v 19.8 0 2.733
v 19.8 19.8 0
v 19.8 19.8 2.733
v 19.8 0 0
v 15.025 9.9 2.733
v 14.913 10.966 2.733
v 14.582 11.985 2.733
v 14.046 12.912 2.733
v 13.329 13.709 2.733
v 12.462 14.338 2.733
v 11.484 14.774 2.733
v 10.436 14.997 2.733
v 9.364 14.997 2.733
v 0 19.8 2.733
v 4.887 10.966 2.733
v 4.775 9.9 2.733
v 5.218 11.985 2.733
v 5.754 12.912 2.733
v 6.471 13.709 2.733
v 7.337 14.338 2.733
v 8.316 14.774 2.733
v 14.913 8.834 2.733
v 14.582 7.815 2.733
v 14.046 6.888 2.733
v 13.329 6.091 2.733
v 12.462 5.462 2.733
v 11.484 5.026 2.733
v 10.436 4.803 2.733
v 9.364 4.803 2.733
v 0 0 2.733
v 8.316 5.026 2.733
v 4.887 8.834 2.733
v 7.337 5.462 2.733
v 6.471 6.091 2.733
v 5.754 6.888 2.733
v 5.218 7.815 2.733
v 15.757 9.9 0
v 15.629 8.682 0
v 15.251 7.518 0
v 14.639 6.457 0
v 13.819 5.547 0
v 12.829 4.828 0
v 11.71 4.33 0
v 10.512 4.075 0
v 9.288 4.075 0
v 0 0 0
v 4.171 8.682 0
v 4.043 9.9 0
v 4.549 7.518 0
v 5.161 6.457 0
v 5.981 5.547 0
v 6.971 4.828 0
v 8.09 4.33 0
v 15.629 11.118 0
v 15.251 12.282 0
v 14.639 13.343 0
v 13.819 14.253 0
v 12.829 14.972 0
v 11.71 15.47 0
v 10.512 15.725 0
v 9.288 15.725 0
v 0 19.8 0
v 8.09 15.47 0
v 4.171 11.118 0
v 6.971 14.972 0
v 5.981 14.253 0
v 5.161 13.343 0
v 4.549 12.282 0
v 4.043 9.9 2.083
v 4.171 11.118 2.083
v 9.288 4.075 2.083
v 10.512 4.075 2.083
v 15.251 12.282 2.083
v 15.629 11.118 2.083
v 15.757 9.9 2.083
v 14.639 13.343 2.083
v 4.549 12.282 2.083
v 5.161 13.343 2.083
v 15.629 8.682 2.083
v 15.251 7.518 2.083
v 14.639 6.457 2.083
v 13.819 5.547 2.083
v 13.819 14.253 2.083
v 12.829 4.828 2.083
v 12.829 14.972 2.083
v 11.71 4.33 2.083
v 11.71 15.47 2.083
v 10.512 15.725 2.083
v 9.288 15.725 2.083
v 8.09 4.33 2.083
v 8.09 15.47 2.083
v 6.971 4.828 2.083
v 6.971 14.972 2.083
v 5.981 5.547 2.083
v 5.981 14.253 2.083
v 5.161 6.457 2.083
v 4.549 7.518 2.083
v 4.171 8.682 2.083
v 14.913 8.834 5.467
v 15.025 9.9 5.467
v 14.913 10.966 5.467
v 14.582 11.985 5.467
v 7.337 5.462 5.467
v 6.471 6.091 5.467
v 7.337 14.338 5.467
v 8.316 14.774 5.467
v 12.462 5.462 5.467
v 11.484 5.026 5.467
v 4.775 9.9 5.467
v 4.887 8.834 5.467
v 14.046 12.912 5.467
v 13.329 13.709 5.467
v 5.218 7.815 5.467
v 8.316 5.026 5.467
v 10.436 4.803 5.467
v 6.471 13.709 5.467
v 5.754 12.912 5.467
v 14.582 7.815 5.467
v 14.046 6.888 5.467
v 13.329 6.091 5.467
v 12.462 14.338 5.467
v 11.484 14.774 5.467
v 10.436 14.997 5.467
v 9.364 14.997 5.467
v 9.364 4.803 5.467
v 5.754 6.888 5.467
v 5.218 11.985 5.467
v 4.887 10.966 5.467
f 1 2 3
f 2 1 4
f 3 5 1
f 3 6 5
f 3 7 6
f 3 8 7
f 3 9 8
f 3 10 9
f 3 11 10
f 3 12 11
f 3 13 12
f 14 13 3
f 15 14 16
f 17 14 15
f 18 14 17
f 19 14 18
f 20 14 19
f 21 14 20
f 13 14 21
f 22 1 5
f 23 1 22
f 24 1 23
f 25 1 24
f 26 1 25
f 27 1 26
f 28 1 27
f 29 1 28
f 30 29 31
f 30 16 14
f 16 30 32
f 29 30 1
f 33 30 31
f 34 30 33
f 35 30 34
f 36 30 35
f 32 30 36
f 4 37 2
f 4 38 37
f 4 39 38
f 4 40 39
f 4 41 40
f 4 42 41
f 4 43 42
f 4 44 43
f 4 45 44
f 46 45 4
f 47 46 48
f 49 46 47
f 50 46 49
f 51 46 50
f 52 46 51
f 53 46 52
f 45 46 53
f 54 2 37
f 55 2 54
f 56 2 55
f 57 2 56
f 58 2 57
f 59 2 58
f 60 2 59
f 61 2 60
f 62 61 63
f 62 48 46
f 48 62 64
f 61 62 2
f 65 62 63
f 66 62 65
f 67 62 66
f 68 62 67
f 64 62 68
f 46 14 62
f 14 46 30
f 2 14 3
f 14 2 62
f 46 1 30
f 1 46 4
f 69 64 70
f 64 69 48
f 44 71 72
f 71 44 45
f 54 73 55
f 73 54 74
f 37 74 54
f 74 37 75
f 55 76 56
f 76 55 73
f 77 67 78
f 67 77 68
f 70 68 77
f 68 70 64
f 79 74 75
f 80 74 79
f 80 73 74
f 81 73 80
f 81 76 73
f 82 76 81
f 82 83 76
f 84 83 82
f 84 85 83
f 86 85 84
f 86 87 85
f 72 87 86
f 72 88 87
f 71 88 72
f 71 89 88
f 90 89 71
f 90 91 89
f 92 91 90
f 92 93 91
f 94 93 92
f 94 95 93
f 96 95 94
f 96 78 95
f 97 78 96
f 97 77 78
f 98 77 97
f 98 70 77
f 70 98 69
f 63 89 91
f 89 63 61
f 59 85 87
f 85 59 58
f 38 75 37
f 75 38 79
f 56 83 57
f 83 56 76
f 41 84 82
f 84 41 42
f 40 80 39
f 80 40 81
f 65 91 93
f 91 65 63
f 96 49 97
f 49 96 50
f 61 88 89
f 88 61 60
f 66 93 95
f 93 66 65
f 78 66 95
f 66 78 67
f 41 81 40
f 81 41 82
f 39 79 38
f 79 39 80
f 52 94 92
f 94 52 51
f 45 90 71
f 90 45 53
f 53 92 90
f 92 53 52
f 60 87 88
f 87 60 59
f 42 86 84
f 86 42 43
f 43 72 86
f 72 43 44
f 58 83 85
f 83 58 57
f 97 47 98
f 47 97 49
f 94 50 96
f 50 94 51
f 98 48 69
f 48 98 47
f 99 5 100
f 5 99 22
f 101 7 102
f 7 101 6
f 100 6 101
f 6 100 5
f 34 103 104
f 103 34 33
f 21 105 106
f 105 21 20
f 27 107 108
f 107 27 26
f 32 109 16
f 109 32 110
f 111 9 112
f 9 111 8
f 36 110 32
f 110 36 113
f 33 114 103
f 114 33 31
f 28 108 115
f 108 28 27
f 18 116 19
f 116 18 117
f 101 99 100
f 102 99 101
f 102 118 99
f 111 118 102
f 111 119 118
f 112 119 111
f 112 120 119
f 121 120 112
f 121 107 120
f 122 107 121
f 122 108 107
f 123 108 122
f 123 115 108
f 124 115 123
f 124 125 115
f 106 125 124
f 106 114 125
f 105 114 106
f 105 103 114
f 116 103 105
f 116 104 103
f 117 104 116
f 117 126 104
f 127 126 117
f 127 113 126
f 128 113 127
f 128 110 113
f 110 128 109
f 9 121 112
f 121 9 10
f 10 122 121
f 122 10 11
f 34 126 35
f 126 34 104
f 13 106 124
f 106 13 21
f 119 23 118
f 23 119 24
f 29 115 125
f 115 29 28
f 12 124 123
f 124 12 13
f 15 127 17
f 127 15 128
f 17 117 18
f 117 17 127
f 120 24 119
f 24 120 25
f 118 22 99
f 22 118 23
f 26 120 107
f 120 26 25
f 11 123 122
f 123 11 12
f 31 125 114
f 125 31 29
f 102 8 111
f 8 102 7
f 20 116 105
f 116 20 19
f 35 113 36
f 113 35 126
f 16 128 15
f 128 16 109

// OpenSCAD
coldiameter = 18;
mod = coldiameter;
colheight = 82;
colid = 10.25;  			    //inner (open) diameter of column
colih = 1.5;				   // height of boss for column
length = colheight * .618;  // for golden rectangle
height = colheight/15;
width = coldiameter * 1.0;  //allows over or under hang if desired
angle = 1;

f_overhang = 2;			  //frieze overhang
f_height = height*2;		  //frieze height
f_d = .03; 					// amount of triglyph inset

c_overhang = 2;			  //cornice overhang
c_height = height *2/3;		  //cornice height
c_length = length;

abacus();
//multi_abacus();
//beam();
//corner();
//qr();
//tri();
//frieze_beam(2); 		  // parmeter is number of trigliphs
//frieze_corner();
//rotate([180,0,0]) translate([0,-18,-f_height-c_height]) {cornice_beam();}
//cornice_beam(1);
//cornice_corner();


module cornice_corner() {

}

module cornice_beam(type) {
	if ( type == 0 ) {
		cube([c_length,width+c_overhang,c_height]);
		}
	if ( type == 1 ) {
		cube([c_length*.75,width+c_overhang,c_height]);
		}
	
	translate([length*.065,width/6.5,c_height])
		cube([length/2-(length*.125),width-(width*.25),c_height/1.5]);

		if (type == 0 ) {
		translate([length/2 + (length*.065),width/6.5,c_height])
			cube([length/2-(length*.125),width-(width*.25),c_height/1.5]);
		}
		if (type == 1 ){
		translate([length/2 + (length*.055),width/6.5,c_height])
			cube([length/2-(length*.312),width-(width*.25),c_height/1.5]);
		}

}


module frieze_corner() {
	union() {	
	difference() {
	cube([length/2+coldiameter/4,width,f_height]);
	translate([length/25,width/10,height/10])
		cube([length/2+coldiameter/4-length/12,width-width/5,f_height]);
	translate([width/2,width/2,0])
		cylinder(h = height/2, r = width/8, $fs = angle);
	}
	//translate([width-length/20,0,0])  cube([length/25,width,f_height]);
	rotate([0,90,0]) {
		qr(length/2+coldiameter/4);
	}
	translate([0,-f_height/12,f_height*.7]) cube([length/2+coldiameter/4,f_height/12,f_height/6]);
	translate([0,0,f_height]) rotate([90.001,0,90])  {
		qr(length/2+coldiameter/4);
	}
	translate([coldiameter/4,-f_height/10,0])
		tri();
	//translate([(length/4)*2+(length/10),-f_height/15,0])
	//	tri();
	}
	union() {
	difference() {
	cube([width,(length/2)+(coldiameter*.75),f_height]);
	translate([width/10,length/30,height/10])
		cube([width-width/5,(length/2)+(coldiameter*.75)-length/15,f_height]);
	translate([width/2,width/2,0])
		cylinder(h = height/2, r = width/8, $fs = angle);
//	translate([width/2,3*length/4,0])
//		cylinder(h = height/2, r = width/8, $fs = angle);	
	}
	//translate([0,width-length/20,0])  cube([length/20,width,f_height]);
	translate([0,length/1.317,0]) rotate([90,90,0]) {
		qr(((length/2)+coldiameter*.79));
	}
	translate([0,-length*.015,f_height]) rotate([180.001,270,90])  {
		qr(((length/2)+coldiameter*.79));
	}
	translate([-f_height/12,-f_height/12,f_height*.7]) cube([f_height/12,length/2+coldiameter*.75+f_height/12,f_height/6]);
	translate([-f_height/10,coldiameter*.76,0]) rotate([0,0,270])
		tri();
	translate([-f_height/10,length-(coldiameter*.7),0]) rotate([0,0,270])
		tri();
	}
}


module frieze_beam(number) {
union() {
	difference() {
	cube([length,width,f_height]);
	translate([length/20,width/10,height/10])
		cube([length-length/10,width-width/5,f_height]);
	translate([length/4,width/2,0])
			cylinder(h = height/2, r = width/8, $fs = angle);
	translate([3*length/4,width/2,0])
			cylinder(h = height/2, r = width/8, $fs = angle);	}
	translate([length/2-length/20,0,0])  cube([length/10,width,f_height]);
	rotate([0,90,0]) {
		qr(length);
	}
	translate([0,0,f_height]) rotate([90.001,0,90])  {
		qr(length);
	}
//	translate([0,width,0]) rotate([90,180,90])  {
//		qr(length);
//	}
//	translate([0,width,f_height]) rotate([90,270,90])  {
//		qr(length);
//	}
#translate([0,-f_height/12,f_height*.7]) cube([length,f_height/12,f_height/6]);
if ( number == 3 ) {
	translate([0,-f_height/15,0])
		tri();
	translate([(length/5)*2,-f_height/15,0])
		tri();
	translate([(length/5)*4,-f_height/15,0])
		tri();
	}
else if ( number == 2 ){
	translate([(length/4)*0,-f_height/10,0])
		tri();
	translate([(length/4)*2,-f_height/10,0])
		tri();
	}
}
}


module qr(len) {

	difference() {
		cylinder(h = len, r = f_height/6, $fs = angle);
		translate([-f_height/3,0,0])
			cube([f_height/2.5,f_height/4,len]);
		translate([0,-f_height/4,0])
			cube([f_height/4,f_height/2,len]);
		}
}

module tri() {
	difference() {

		translate([0,0,f_height/7])
			cube([coldiameter/2,f_height/10,f_height-f_height/3]);					//basic plate shape
		translate([0,-f_height*f_d,0])
			scale([1,1.5,1]) cylinder(r = coldiameter*.05, h = f_height-f_height/6, $fs = .05);	//left half groove
		translate([coldiameter*.167,-f_height*f_d,0])
			scale([1,1.5,1]) cylinder(r = coldiameter*.05, h = f_height-f_height/6, $fs = .05);	//left full groove
		translate([coldiameter*.333,-f_height*f_d,0])
			scale([1,1.5,1]) cylinder(r = coldiameter*.05, h = f_height-f_height/6, $fs = .05);	//right full groove
		translate([coldiameter/2,-f_height*f_d,0])
			scale([1,1.5,1]) cylinder(r = coldiameter*.05, h = f_height-f_height/6, $fs = .05);	//right half groove
		}
	translate([0,-f_height/20,f_height*.7])
		cube([coldiameter/2,f_height/7,f_height/7]);
}

module beam() {
	difference() {
		cube([length, width, height]);
		translate([length/4,width/2,0])
			# cylinder(h = height/2, r = width/8, $fs = angle);
		translate([3*length/4,width/2,0])
			# cylinder(h = height/2, r = width/8, $fs = angle);		}
	difference() {
		translate([0,width/2,0])
			cylinder(h = (height + colih), r = colid/2, $fs = angle);
		translate([-colid/2,0,0])
			cube([colid/2,width,height*2]);
		}
	difference() {
		translate([length,width/2,0])
			cylinder(h = (height + colih), r = colid/2, $fs = angle);
		translate([length,0,0])
			cube([colid/2,width,height*2]);
		}
}

module corner() {
	difference() {
		cube([length+width/2, width, height]);
		translate([width/2,width/2,0])
			cylinder(h = height/2, r = width/8, $fs = angle);
		translate([3*(length+width/2)/4,width/2,0])
			cylinder(h = height/2, r = width/8, $fs = angle);	
		}
	difference() {
		translate([0,width,0])
			cube([width, length-width/2, height]);
		translate([width/2,3*(length+width/2)/4,0])
			cylinder(h = height/2, r = width/8, $fs = angle);
		}
	translate([width/2,width/2,height/2])
		cylinder(h = (height/2 + colih), r = colid/2, $fs = angle);
	difference() {
		translate([length+width/2,width/2,0])
			cylinder(h = (height + colih), r = colid/2, $fs = angle);
		translate([length+width/2,0,0])
			cube([colid/2,width,height*2]);
		}
	difference() {
		translate([width/2,length+width/2,0])
			cylinder(h = (height + colih), r = colid/2, $fs = angle);
		translate([0,length+width/2,0])
			cube([width,colid/2,height*2]);
		}
}

module abacus() {
	translate([(width*1.1)/2,(width*1.1)/2,height/2])
		cylinder(h = height/2, r = colid/2, $fs = angle);
	difference() {
		cube([width*1.1,width*1.1,height/2]);
		translate([(width*1.1)/2,(width*1.1)/2,0])
			cylinder(h = (height/2)-.65, r =colid/1.75, $fs = angle);
		}
}

module multi_abacus() {
abacus();
translate([width*1.5,0,0])
	abacus();
translate([0,width*1.5,0])
	abacus();
translate([width*1.5,width*1.5,0])
	abacus();
}
